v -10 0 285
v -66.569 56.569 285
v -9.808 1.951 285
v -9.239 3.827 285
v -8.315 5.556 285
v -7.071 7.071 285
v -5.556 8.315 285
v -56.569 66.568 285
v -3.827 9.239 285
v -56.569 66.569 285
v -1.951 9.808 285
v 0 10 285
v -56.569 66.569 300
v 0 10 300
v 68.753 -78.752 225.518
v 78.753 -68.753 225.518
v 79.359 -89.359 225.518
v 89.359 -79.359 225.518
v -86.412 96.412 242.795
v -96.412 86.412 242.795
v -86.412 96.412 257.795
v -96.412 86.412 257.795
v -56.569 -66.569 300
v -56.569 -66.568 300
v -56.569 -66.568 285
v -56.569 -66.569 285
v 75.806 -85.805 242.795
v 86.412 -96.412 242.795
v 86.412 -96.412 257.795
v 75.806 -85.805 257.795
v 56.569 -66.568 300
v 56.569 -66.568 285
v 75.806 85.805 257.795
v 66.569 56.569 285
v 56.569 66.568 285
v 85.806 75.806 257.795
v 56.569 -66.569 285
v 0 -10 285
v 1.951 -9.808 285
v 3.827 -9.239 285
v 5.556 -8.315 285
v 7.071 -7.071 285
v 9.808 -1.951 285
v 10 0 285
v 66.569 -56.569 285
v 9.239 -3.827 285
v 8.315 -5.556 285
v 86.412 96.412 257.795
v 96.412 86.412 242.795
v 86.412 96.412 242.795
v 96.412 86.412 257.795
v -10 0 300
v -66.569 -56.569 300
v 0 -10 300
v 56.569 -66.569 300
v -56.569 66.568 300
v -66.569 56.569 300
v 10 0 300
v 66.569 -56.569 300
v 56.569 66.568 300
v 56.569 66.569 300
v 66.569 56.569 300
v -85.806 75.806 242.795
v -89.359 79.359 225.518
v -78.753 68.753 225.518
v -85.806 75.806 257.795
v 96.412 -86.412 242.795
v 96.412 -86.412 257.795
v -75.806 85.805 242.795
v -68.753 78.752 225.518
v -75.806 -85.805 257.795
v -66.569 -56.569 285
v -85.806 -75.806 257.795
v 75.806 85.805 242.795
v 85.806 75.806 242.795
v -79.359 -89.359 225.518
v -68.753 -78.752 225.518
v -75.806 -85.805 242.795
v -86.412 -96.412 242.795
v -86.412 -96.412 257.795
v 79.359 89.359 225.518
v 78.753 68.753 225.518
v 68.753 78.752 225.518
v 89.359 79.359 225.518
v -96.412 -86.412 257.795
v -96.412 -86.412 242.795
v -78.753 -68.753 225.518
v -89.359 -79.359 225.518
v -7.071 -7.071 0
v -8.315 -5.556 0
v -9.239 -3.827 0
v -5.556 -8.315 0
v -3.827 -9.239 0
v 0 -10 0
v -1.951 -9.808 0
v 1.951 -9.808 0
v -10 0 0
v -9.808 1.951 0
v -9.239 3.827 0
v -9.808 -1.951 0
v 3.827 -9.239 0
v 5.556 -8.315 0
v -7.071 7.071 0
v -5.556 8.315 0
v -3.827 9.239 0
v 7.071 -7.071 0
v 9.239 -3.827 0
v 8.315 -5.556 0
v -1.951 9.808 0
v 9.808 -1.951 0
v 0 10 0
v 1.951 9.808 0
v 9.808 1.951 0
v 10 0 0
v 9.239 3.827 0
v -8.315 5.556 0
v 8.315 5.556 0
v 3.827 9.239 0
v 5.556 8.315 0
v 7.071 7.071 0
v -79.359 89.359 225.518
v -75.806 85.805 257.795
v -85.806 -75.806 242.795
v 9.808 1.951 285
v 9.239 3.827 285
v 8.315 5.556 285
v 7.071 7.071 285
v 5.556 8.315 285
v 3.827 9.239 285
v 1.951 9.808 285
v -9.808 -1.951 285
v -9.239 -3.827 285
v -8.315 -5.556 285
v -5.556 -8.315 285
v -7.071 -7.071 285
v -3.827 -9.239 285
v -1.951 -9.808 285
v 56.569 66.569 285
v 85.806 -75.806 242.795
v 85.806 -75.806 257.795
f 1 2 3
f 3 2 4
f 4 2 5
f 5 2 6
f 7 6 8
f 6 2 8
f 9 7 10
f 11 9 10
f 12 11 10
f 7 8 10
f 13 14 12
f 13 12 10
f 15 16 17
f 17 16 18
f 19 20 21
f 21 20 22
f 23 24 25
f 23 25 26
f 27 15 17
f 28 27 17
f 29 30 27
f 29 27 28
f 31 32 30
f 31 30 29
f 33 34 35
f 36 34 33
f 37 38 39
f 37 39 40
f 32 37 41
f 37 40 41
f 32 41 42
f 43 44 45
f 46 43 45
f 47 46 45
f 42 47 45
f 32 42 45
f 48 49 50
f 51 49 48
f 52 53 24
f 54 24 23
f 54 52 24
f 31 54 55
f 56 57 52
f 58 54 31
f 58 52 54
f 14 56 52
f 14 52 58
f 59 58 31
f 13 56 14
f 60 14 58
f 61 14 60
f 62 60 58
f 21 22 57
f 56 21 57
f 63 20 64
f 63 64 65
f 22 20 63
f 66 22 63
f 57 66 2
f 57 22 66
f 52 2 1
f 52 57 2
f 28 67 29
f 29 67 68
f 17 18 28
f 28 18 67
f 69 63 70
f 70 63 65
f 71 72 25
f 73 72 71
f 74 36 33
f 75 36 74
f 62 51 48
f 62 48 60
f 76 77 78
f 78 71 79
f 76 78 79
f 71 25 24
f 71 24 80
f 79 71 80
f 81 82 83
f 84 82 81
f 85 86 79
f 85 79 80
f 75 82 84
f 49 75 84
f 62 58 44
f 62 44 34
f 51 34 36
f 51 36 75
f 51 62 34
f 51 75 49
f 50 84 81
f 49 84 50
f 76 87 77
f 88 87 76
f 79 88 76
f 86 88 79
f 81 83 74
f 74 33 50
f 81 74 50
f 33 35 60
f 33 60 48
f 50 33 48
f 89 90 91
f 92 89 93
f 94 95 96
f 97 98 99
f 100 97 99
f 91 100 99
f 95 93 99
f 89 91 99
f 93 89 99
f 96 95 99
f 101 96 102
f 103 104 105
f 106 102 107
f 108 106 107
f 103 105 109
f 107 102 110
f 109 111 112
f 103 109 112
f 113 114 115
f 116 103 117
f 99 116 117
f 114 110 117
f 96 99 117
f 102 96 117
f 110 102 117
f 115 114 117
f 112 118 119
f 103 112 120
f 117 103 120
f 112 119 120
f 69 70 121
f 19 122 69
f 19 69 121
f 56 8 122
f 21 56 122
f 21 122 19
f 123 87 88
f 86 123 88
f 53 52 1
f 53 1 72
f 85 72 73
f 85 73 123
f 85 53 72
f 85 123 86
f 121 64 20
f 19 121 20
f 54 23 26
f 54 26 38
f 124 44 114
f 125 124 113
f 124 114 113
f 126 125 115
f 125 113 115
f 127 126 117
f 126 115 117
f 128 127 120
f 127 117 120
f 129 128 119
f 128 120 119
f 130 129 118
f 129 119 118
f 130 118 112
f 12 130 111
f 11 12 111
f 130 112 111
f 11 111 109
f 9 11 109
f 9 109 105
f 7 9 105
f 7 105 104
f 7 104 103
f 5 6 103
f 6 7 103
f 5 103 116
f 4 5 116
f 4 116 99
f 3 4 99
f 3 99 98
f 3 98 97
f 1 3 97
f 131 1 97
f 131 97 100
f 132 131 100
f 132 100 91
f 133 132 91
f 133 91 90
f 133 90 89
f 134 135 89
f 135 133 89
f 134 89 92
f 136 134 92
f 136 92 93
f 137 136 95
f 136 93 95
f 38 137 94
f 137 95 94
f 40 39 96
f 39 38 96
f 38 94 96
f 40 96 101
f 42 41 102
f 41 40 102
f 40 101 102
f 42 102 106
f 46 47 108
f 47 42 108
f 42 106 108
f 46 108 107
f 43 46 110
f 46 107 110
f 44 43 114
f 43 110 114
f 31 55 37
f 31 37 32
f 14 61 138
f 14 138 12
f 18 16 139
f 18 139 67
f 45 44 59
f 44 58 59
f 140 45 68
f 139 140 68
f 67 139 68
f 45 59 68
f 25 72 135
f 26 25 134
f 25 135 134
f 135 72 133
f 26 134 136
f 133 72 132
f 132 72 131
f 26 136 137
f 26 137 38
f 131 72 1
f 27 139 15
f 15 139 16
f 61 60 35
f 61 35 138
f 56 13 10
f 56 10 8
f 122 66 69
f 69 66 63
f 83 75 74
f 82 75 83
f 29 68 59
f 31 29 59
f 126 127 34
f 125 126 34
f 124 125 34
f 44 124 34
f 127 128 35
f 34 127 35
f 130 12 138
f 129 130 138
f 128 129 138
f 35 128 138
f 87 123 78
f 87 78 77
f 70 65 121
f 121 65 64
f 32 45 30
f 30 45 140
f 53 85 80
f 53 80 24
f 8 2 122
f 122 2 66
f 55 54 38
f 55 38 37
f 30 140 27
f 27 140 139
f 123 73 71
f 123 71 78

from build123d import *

# Parameters (mm, degrees)
F0_R     = 10
F1_DEPTH = 300
F3_DEPTH = 15
F5_DEPTH = 14.142


# Not quite as in the source:
# - a feature of the source that left no trace in its solid (it failed there, or was rolled back) is left out


with BuildPart() as f1:
    # F0 (on Top) → F1 (new body)
    with BuildSketch(Plane.XY):
        Circle(F0_R)
    extrude(amount=F1_DEPTH)

    # F2 (on face) → F3 (join)
    with BuildSketch(Plane.XY.offset(300)):
        Polygon((10, 0), (10, 10), (0, 10), (-10, 10), (-10, 0), (-10, -10), (0, -10), (10, -10), align=None)
        Polygon((0, 10), (10, 10), (10, 0), (66.5685424949, 56.5685424949), (56.5685424949, 66.5685424949), align=None)
        Polygon((-10, 10), (0, 10), (-56.5685424949, 66.5685424949), (-66.5685424949, 56.5685424949), (-10, 0), align=None)
        Polygon((66.5685424949, -56.5685424949), (10, 0), (10, -10), (0, -10), (56.5685424949, -66.5685424949), align=None)
        Polygon((-10, -10), (-10, 0), (-66.5685424949, -56.5685424949), (-56.5685424949, -66.5685424949), (0, -10), align=None)
    extrude(amount=-F3_DEPTH)

    # F4 (on face) → F5 (join)
    with BuildSketch(Plane(origin=(5, -5, 0), x_dir=(0.7071067812, 0.7071067812, 0), z_dir=(0.7071067812, -0.7071067812, 0))):
        Polygon((129.2763065782, 257.7947612337), (87.0710678119, 300), (87.0710678119, 285), (114.2763065782, 257.7947612337), (114.2763065782, 242.7947612337), (129.2763065782, 242.7947612337), align=None)
        Polygon((119.3018365804, 225.5184724189), (129.2763065782, 242.7947612337), (114.2763065782, 242.7947612337), (104.3018365804, 225.5184724189), align=None)
    extrude(amount=-F5_DEPTH)

    # F6: F1 across plane


with BuildPart() as f1_1:
    add(f1.part)
    add(f1.part.mirror(Plane.XZ))

    # F7: F1 across plane


with BuildPart() as f1_2:
    add(f1_1.part)
    add(f1_1.part.mirror(Plane.YZ))


solid = f1_2.part
